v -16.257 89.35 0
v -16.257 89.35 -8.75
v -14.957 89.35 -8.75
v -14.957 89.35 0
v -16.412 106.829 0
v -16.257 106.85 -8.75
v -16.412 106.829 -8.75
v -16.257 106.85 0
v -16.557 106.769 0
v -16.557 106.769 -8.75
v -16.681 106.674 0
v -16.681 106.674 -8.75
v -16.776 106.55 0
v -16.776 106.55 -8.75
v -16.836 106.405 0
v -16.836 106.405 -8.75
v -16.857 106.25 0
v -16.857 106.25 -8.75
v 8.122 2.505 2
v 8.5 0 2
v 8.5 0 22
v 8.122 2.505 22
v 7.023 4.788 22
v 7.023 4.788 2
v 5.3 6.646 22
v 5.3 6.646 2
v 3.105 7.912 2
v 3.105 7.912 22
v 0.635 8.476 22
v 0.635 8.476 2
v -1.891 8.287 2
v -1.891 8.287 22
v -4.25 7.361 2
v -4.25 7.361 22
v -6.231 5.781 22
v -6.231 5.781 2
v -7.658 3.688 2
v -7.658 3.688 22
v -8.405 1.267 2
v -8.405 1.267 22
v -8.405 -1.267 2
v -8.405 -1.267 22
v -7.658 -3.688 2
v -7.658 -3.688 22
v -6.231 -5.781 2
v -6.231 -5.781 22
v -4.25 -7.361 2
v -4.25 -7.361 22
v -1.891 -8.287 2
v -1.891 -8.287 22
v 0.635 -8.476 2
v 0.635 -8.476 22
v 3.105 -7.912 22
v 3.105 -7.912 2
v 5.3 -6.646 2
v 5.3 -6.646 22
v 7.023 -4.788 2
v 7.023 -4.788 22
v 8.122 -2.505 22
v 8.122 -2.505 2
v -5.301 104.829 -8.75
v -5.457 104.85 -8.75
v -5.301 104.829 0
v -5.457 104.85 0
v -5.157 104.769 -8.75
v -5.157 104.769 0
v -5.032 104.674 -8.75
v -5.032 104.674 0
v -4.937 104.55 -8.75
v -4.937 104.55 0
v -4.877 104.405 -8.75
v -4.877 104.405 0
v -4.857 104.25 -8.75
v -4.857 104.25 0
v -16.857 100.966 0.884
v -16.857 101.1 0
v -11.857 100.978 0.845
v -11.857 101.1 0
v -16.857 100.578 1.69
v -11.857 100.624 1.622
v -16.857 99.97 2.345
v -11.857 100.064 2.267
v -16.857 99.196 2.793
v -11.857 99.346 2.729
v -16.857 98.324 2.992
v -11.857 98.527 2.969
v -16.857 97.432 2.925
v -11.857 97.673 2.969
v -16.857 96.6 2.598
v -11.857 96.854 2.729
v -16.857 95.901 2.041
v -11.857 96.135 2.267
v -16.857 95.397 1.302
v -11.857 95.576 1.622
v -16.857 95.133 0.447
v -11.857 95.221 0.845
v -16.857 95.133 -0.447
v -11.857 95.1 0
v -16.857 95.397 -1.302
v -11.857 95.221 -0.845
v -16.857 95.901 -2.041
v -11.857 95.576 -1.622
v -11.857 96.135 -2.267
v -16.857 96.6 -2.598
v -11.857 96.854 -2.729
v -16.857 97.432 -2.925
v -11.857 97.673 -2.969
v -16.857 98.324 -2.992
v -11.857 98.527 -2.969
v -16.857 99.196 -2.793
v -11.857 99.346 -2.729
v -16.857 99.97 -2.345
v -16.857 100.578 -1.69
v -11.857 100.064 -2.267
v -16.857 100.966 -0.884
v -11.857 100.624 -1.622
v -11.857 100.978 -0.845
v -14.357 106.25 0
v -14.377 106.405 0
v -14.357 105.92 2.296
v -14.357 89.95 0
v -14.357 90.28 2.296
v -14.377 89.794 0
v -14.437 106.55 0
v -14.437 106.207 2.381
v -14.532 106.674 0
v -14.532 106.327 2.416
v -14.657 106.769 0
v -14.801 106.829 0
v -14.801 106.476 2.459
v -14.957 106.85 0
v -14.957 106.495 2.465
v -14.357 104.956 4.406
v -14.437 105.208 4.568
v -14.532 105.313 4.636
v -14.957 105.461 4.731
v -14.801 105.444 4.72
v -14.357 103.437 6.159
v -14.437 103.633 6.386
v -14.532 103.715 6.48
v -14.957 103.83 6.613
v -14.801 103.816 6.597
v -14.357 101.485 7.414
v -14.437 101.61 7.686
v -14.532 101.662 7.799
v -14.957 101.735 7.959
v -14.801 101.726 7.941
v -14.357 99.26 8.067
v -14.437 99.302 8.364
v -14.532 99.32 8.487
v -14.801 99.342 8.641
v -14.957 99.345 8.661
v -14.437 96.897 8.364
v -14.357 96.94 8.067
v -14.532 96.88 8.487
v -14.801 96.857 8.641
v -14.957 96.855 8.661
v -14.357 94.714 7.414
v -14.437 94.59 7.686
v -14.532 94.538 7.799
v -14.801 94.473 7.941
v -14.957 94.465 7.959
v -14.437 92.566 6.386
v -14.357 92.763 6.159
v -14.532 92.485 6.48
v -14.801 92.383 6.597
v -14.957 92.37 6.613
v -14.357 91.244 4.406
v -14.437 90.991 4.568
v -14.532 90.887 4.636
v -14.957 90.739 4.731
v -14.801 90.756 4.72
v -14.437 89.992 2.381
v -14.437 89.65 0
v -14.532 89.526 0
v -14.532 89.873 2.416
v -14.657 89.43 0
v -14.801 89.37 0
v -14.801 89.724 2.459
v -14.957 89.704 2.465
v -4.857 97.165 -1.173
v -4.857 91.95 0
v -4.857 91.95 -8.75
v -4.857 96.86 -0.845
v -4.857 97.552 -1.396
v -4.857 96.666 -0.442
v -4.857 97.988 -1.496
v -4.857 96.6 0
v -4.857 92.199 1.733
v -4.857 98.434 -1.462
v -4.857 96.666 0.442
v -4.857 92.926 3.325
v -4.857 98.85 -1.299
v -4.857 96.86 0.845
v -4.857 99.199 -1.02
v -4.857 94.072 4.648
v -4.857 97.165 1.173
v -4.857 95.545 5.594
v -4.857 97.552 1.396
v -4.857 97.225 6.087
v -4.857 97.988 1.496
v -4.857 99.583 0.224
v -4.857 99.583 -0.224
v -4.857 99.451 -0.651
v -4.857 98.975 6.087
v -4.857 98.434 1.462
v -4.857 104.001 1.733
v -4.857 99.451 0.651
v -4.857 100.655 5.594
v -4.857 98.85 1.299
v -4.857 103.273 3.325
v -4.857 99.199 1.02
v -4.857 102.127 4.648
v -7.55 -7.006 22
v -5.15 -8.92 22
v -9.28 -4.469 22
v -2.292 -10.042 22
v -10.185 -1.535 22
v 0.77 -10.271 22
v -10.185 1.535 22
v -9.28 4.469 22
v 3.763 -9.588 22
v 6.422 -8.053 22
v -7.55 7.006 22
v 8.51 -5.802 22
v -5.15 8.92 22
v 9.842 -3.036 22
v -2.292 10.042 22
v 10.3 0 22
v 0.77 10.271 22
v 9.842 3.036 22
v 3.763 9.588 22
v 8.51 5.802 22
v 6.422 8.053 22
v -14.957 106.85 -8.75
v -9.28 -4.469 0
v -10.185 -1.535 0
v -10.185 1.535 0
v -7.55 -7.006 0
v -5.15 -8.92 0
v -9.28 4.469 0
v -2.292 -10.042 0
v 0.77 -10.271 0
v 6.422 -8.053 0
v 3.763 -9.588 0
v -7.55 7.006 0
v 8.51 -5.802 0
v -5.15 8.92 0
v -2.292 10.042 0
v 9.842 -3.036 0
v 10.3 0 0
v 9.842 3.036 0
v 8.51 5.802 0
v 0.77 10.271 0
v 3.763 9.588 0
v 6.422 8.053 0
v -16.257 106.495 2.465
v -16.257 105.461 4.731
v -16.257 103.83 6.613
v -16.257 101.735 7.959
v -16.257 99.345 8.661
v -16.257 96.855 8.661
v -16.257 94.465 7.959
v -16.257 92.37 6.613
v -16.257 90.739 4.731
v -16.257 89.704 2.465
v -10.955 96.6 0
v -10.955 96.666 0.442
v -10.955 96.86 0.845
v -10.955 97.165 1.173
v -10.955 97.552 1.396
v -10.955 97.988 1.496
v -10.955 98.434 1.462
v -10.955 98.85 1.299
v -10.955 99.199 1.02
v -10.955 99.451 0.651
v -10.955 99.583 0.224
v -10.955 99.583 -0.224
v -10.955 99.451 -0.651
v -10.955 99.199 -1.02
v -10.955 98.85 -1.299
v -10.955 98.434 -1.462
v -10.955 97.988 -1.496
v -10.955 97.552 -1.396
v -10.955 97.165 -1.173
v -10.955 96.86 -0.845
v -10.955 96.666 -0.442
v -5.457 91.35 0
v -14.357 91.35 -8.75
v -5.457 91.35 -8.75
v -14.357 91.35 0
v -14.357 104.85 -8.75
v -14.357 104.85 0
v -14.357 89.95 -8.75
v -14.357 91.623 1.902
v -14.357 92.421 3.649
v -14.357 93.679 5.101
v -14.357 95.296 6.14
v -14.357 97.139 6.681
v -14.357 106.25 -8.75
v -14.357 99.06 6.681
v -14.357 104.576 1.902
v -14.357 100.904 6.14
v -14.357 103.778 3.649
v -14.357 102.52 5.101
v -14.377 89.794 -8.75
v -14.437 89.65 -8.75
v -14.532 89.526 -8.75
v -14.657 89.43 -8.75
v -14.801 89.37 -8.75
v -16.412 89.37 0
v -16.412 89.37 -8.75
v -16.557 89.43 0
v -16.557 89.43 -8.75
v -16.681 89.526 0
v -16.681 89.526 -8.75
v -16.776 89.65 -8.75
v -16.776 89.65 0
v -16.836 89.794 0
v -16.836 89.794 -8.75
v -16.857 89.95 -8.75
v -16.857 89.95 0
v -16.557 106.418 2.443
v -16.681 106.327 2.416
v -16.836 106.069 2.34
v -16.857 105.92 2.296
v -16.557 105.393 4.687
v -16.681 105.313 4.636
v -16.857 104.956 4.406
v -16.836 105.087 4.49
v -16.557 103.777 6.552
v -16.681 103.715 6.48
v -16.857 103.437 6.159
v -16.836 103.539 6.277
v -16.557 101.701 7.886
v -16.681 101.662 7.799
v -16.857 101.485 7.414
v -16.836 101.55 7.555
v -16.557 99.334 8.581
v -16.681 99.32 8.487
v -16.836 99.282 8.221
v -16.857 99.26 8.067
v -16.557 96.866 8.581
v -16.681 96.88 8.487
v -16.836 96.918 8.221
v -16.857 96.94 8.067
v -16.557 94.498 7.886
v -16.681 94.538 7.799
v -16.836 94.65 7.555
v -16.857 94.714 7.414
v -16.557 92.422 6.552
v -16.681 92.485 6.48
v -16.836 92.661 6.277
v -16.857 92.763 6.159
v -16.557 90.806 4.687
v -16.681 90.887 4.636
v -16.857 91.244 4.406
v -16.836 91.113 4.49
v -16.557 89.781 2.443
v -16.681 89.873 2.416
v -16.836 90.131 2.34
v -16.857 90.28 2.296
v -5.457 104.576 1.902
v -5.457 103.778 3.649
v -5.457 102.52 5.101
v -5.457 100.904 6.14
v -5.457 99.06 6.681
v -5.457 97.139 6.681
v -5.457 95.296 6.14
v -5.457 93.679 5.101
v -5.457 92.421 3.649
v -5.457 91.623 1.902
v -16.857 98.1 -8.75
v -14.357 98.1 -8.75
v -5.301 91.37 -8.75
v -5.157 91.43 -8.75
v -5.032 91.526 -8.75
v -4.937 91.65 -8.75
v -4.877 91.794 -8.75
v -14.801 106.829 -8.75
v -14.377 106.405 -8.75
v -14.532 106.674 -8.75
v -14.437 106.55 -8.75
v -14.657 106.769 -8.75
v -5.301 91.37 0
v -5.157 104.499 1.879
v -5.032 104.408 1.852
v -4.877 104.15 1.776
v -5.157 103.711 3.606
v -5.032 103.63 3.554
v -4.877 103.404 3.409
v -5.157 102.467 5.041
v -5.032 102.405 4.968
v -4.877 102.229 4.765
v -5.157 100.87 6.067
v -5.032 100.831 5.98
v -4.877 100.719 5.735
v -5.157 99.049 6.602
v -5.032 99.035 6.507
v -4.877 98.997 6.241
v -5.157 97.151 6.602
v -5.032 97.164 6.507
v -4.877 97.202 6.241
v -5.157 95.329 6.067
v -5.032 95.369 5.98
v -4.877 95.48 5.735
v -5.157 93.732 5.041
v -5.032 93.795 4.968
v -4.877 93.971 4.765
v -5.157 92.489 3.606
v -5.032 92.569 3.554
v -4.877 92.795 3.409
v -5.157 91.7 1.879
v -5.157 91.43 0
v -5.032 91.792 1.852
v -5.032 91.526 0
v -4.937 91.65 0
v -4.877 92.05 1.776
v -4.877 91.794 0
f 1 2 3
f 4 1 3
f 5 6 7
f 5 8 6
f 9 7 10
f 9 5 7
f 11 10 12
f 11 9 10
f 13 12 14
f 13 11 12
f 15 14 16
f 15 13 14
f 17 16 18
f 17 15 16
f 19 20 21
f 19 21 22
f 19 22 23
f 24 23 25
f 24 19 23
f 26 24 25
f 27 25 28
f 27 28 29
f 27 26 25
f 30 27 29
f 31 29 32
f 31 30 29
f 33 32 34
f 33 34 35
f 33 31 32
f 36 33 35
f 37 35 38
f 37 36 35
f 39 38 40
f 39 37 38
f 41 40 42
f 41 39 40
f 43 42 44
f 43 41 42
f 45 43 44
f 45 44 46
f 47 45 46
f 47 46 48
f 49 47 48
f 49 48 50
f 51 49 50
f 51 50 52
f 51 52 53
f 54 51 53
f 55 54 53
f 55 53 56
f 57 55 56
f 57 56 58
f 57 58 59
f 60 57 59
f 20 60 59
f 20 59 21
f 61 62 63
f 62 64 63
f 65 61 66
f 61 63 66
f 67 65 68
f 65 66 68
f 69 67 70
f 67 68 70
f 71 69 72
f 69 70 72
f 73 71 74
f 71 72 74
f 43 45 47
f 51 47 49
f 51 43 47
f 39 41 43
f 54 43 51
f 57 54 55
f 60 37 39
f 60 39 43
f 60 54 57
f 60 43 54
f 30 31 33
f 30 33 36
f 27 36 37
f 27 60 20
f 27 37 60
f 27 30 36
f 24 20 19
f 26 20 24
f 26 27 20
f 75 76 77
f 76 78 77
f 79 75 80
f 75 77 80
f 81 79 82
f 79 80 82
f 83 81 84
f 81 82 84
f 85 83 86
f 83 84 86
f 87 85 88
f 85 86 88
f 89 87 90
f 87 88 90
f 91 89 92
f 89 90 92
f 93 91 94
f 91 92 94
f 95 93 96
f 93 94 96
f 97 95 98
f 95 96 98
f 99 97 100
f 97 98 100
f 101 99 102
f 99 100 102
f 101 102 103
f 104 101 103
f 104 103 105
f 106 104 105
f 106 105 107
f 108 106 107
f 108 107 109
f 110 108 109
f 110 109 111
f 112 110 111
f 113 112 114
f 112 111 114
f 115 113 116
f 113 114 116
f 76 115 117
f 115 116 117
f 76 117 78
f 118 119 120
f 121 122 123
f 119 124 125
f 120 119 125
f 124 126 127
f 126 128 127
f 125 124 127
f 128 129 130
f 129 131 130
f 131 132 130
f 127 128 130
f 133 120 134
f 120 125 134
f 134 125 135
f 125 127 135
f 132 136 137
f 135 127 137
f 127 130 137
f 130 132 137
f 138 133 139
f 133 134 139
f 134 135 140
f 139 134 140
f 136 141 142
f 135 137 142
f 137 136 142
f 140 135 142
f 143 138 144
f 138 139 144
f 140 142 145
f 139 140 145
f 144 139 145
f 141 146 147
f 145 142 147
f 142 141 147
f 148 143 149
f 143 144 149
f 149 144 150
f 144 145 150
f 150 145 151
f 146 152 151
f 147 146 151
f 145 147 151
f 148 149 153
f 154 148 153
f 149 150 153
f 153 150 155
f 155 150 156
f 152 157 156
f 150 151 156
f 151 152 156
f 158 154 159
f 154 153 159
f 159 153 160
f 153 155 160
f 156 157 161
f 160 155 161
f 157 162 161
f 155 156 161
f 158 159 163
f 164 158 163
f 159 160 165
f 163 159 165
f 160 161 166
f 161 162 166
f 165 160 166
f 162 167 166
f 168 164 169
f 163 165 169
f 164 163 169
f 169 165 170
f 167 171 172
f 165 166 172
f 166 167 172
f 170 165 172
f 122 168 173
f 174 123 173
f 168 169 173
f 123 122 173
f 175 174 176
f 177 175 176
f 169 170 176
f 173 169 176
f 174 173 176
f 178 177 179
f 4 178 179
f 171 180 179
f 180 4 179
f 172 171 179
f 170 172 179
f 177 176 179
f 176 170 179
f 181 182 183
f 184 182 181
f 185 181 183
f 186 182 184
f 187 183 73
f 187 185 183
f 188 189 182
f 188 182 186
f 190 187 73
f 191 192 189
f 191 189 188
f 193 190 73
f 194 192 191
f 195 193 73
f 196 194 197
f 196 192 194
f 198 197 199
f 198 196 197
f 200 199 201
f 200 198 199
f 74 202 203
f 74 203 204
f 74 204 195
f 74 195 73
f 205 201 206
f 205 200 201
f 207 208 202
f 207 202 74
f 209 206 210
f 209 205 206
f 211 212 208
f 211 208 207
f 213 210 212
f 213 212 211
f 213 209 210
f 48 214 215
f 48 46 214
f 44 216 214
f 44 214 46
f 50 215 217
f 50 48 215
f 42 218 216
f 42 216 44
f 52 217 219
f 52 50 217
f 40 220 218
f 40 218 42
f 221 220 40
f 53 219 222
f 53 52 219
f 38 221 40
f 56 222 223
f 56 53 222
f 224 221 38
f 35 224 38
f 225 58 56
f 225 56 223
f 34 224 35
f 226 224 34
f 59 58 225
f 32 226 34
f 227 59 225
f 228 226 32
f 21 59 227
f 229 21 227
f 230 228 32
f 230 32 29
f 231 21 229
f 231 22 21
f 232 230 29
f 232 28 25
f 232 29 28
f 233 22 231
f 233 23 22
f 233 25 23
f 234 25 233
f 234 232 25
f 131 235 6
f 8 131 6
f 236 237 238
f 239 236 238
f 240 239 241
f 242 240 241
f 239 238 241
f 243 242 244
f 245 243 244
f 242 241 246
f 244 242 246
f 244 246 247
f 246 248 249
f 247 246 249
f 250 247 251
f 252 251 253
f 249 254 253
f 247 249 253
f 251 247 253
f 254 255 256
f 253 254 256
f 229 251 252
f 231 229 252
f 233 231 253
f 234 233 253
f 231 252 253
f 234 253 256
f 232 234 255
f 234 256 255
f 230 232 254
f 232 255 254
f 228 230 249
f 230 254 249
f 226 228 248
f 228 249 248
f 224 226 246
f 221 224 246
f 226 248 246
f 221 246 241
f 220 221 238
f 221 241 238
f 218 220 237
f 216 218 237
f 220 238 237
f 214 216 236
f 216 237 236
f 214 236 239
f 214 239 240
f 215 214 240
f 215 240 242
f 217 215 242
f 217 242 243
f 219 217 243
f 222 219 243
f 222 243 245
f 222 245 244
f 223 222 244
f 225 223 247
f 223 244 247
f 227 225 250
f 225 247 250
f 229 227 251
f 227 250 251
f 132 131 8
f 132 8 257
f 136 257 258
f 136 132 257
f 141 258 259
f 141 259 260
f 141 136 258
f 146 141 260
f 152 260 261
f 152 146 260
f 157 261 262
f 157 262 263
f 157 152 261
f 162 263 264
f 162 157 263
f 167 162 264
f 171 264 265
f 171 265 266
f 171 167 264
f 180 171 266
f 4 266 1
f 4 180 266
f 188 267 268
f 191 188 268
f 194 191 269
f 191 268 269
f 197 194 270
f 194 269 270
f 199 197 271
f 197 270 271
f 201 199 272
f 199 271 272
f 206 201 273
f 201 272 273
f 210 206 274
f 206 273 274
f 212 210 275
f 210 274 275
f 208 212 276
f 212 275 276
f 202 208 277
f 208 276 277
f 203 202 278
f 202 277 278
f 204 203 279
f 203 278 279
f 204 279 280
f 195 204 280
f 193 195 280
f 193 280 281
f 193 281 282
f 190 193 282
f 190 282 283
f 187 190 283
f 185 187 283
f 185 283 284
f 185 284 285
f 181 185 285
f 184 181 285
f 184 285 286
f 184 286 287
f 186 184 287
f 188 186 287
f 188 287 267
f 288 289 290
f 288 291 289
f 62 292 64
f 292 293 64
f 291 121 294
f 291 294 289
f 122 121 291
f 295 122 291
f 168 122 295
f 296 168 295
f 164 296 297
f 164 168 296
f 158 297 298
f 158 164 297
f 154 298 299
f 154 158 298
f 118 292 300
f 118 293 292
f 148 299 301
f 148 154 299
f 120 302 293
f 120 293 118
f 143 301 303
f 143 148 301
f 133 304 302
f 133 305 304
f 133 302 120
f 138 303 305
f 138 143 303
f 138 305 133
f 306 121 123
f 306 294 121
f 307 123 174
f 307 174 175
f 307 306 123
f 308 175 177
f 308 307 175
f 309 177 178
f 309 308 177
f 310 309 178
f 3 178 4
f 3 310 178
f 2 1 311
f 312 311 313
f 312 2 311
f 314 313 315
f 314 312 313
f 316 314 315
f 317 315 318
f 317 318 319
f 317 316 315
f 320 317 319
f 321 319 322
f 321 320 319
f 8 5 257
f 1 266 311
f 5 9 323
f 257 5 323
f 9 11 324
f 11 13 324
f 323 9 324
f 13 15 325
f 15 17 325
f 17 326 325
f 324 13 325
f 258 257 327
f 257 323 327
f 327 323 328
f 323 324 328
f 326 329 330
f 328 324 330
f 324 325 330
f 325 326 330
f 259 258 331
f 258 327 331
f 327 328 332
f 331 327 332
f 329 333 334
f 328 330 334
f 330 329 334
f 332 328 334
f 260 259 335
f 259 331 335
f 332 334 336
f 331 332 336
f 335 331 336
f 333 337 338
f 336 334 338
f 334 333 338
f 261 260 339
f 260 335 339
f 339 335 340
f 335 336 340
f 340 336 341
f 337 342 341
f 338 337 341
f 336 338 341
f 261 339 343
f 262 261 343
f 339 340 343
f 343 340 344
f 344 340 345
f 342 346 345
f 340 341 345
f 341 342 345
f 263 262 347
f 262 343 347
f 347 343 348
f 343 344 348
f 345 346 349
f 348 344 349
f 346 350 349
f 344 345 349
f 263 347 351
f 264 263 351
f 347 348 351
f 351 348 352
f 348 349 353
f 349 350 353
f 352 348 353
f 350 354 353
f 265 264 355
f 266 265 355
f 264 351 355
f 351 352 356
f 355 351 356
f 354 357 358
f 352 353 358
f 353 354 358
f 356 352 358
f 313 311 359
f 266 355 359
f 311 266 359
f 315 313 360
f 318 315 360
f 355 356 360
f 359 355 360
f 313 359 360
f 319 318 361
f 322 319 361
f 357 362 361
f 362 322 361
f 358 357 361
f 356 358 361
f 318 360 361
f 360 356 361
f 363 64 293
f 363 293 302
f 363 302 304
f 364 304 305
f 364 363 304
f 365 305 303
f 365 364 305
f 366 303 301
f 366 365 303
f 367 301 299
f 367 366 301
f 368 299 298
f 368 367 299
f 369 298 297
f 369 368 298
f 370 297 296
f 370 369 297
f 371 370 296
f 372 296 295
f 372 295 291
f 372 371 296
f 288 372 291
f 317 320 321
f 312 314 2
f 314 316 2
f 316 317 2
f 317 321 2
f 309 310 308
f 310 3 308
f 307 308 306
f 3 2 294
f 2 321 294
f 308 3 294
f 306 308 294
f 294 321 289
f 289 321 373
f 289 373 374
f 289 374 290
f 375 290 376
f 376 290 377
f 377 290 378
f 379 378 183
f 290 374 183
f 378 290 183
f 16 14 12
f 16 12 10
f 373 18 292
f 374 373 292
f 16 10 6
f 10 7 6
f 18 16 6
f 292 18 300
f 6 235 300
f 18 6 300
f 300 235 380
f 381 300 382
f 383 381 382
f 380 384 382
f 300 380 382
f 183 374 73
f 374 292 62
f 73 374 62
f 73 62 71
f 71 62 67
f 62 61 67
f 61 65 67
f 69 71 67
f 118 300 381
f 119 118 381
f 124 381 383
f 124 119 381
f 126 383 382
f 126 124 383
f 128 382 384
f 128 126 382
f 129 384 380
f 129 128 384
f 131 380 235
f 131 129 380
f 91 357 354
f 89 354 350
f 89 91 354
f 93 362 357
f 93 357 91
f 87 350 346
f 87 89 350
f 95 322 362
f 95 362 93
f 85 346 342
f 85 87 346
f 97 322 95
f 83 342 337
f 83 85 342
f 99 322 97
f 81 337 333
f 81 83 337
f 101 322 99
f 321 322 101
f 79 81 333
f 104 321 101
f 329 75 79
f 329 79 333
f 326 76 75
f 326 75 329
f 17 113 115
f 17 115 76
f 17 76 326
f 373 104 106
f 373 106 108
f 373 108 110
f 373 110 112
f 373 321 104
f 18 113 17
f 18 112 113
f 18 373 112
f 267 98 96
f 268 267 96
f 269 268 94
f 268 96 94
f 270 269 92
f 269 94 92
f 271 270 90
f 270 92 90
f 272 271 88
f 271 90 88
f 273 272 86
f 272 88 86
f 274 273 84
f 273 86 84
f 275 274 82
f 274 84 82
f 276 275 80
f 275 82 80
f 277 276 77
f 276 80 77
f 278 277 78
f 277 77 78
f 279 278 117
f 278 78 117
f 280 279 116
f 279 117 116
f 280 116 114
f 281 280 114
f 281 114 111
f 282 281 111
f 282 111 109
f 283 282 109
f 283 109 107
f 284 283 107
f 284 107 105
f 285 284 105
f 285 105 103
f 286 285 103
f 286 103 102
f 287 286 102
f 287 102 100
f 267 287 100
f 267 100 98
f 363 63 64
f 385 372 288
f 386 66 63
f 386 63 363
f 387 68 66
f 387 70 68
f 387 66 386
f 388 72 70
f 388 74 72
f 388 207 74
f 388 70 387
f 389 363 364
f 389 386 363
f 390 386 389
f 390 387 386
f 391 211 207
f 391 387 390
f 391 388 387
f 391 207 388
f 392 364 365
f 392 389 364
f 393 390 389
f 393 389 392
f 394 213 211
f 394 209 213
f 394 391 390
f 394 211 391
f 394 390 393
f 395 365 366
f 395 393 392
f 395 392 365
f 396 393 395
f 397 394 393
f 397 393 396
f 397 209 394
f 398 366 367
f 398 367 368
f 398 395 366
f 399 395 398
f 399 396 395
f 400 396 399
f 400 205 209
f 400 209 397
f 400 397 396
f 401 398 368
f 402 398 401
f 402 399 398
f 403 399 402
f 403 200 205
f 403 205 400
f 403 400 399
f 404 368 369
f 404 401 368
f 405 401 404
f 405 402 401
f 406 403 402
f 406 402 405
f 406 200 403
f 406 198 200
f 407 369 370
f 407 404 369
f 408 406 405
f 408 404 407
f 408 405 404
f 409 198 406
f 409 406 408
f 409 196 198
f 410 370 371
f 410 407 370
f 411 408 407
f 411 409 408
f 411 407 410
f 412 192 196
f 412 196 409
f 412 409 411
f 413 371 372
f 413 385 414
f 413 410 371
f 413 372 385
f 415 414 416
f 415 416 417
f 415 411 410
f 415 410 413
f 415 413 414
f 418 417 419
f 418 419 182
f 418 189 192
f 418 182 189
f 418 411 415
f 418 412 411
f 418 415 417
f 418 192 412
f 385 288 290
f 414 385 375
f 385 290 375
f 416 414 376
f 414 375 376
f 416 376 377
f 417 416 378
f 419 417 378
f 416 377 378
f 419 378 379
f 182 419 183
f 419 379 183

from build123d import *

# Parameters (mm, degrees)
F0_R     = 8.5
F1_DEPTH = 2
F0_R_2   = 10.3
F2_DEPTH = 22
F0_W     = 9.5
F0_H     = 5.25
F0_W_2   = 2.5
F0_H_2   = 1.5
F3_DEPTH = 8.75
F5_R     = 1.5
F6_DEPTH = 27.1577554153
F7_R     = 0.6
F8_D     = 6
F8_DEPTH = 5
F8_TIP   = 1.8025818571


with BuildPart() as f1:
    # F0 (on Top) → F1 (new body)
    with BuildSketch(Plane.XY):
        Circle(F0_R)
    extrude(amount=F1_DEPTH)

    # F0 (on Top) → F2 (join)
    with BuildSketch(Plane.XY):
        Circle(F0_R_2)
        Circle(F0_R, mode=Mode.SUBTRACT)
    extrude(amount=F2_DEPTH)


with BuildPart() as f3:
    # F0 (on Top) → F3 (new body)
    with BuildSketch(Plane.XY):
        with Locations((-9.6067554153, 102.2247694518)):
            Rectangle(F0_W, F0_H)
        Polygon((-16.8567554153, 99.5997694518), (-14.3567554153, 99.5997694518), (-14.3567554153, 104.8497694518), (-14.3567554153, 106.8497694518), (-16.8567554153, 106.8497694518), align=None)
        with Locations((-15.6067554153, 97.3497694518)):
            Rectangle(F0_W_2, F0_H_2)
        with Locations((-15.6067554153, 98.8497694518)):
            Rectangle(F0_W_2, F0_H_2)
        with Locations((-9.6067554153, 97.3497694518)):
            Rectangle(F0_W, F0_H_2)
        with Locations((-9.6067554153, 98.8497694518)):
            Rectangle(F0_W, F0_H_2)
        with Locations((-9.6067554153, 93.9747694518)):
            Rectangle(F0_W, F0_H)
        Polygon((-14.3567554153, 89.3497694518), (-14.3567554153, 91.3497694518), (-14.3567554153, 96.5997694518), (-16.8567554153, 96.5997694518), (-16.8567554153, 89.3497694518), align=None)
    extrude(amount=-F3_DEPTH)

    # F0 (on Top) → F4 (revolve)
    with BuildSketch(Plane.XY):
        with Locations((-9.6067554153, 97.3497694518)):
            Rectangle(F0_W, F0_H_2)
        with Locations((-15.6067554153, 97.3497694518)):
            Rectangle(F0_W_2, F0_H_2)
        Polygon((-14.3567554153, 89.3497694518), (-14.3567554153, 91.3497694518), (-14.3567554153, 96.5997694518), (-16.8567554153, 96.5997694518), (-16.8567554153, 89.3497694518), align=None)
        with Locations((-9.6067554153, 93.9747694518)):
            Rectangle(F0_W, F0_H)
    revolve(axis=Axis((-10.8567554153, 98.0997694518, 0), (1, 0, 0)))

    # F5 (on face) → F6 (cut, through all)
    with BuildSketch(Plane(origin=(-16.8567554153, 0, 0), x_dir=(0, -1, 0), z_dir=(-1, 0, 0))):
        with Locations((-98.0997694518, 0)):
            Circle(F5_R)
    extrude(amount=-F6_DEPTH, mode=Mode.SUBTRACT)

    # F7
    f7_edges = [f3.edges().sort_by_distance(p)[0] for p in [
        (-16.856755, 89.349769, -4.375),
        (-16.856755, 106.849769, -4.375),
        (-15.606755, 98.099769, -8.75),
        (-14.356755, 89.349769, -4.375),
        (-14.356755, 106.849769, -4.375),
        (-4.856755, 91.349769, -4.375),
        (-4.856755, 98.099769, 6.75),
        (-4.856755, 104.849769, -4.375),
        (-14.356755, 98.099769, 8.75),
        (-16.856755, 98.099769, 8.75),
    ]]
    fillet(f7_edges, radius=F7_R)

    # F8
    with Locations(Plane(origin=(-16.8567554153, 0, 0), x_dir=(0, -1, 0), z_dir=(-1, 0, 0))):
        with Locations((-98.0997694518, 0)):
            Hole(F8_D / 2, depth=F8_DEPTH)
            with Locations((0, 0, -(F8_DEPTH + F8_TIP / 2))):  # 118° drill point
                Cone(0, F8_D / 2, F8_TIP, mode=Mode.SUBTRACT)


solid = Compound([f1.part, f3.part])
